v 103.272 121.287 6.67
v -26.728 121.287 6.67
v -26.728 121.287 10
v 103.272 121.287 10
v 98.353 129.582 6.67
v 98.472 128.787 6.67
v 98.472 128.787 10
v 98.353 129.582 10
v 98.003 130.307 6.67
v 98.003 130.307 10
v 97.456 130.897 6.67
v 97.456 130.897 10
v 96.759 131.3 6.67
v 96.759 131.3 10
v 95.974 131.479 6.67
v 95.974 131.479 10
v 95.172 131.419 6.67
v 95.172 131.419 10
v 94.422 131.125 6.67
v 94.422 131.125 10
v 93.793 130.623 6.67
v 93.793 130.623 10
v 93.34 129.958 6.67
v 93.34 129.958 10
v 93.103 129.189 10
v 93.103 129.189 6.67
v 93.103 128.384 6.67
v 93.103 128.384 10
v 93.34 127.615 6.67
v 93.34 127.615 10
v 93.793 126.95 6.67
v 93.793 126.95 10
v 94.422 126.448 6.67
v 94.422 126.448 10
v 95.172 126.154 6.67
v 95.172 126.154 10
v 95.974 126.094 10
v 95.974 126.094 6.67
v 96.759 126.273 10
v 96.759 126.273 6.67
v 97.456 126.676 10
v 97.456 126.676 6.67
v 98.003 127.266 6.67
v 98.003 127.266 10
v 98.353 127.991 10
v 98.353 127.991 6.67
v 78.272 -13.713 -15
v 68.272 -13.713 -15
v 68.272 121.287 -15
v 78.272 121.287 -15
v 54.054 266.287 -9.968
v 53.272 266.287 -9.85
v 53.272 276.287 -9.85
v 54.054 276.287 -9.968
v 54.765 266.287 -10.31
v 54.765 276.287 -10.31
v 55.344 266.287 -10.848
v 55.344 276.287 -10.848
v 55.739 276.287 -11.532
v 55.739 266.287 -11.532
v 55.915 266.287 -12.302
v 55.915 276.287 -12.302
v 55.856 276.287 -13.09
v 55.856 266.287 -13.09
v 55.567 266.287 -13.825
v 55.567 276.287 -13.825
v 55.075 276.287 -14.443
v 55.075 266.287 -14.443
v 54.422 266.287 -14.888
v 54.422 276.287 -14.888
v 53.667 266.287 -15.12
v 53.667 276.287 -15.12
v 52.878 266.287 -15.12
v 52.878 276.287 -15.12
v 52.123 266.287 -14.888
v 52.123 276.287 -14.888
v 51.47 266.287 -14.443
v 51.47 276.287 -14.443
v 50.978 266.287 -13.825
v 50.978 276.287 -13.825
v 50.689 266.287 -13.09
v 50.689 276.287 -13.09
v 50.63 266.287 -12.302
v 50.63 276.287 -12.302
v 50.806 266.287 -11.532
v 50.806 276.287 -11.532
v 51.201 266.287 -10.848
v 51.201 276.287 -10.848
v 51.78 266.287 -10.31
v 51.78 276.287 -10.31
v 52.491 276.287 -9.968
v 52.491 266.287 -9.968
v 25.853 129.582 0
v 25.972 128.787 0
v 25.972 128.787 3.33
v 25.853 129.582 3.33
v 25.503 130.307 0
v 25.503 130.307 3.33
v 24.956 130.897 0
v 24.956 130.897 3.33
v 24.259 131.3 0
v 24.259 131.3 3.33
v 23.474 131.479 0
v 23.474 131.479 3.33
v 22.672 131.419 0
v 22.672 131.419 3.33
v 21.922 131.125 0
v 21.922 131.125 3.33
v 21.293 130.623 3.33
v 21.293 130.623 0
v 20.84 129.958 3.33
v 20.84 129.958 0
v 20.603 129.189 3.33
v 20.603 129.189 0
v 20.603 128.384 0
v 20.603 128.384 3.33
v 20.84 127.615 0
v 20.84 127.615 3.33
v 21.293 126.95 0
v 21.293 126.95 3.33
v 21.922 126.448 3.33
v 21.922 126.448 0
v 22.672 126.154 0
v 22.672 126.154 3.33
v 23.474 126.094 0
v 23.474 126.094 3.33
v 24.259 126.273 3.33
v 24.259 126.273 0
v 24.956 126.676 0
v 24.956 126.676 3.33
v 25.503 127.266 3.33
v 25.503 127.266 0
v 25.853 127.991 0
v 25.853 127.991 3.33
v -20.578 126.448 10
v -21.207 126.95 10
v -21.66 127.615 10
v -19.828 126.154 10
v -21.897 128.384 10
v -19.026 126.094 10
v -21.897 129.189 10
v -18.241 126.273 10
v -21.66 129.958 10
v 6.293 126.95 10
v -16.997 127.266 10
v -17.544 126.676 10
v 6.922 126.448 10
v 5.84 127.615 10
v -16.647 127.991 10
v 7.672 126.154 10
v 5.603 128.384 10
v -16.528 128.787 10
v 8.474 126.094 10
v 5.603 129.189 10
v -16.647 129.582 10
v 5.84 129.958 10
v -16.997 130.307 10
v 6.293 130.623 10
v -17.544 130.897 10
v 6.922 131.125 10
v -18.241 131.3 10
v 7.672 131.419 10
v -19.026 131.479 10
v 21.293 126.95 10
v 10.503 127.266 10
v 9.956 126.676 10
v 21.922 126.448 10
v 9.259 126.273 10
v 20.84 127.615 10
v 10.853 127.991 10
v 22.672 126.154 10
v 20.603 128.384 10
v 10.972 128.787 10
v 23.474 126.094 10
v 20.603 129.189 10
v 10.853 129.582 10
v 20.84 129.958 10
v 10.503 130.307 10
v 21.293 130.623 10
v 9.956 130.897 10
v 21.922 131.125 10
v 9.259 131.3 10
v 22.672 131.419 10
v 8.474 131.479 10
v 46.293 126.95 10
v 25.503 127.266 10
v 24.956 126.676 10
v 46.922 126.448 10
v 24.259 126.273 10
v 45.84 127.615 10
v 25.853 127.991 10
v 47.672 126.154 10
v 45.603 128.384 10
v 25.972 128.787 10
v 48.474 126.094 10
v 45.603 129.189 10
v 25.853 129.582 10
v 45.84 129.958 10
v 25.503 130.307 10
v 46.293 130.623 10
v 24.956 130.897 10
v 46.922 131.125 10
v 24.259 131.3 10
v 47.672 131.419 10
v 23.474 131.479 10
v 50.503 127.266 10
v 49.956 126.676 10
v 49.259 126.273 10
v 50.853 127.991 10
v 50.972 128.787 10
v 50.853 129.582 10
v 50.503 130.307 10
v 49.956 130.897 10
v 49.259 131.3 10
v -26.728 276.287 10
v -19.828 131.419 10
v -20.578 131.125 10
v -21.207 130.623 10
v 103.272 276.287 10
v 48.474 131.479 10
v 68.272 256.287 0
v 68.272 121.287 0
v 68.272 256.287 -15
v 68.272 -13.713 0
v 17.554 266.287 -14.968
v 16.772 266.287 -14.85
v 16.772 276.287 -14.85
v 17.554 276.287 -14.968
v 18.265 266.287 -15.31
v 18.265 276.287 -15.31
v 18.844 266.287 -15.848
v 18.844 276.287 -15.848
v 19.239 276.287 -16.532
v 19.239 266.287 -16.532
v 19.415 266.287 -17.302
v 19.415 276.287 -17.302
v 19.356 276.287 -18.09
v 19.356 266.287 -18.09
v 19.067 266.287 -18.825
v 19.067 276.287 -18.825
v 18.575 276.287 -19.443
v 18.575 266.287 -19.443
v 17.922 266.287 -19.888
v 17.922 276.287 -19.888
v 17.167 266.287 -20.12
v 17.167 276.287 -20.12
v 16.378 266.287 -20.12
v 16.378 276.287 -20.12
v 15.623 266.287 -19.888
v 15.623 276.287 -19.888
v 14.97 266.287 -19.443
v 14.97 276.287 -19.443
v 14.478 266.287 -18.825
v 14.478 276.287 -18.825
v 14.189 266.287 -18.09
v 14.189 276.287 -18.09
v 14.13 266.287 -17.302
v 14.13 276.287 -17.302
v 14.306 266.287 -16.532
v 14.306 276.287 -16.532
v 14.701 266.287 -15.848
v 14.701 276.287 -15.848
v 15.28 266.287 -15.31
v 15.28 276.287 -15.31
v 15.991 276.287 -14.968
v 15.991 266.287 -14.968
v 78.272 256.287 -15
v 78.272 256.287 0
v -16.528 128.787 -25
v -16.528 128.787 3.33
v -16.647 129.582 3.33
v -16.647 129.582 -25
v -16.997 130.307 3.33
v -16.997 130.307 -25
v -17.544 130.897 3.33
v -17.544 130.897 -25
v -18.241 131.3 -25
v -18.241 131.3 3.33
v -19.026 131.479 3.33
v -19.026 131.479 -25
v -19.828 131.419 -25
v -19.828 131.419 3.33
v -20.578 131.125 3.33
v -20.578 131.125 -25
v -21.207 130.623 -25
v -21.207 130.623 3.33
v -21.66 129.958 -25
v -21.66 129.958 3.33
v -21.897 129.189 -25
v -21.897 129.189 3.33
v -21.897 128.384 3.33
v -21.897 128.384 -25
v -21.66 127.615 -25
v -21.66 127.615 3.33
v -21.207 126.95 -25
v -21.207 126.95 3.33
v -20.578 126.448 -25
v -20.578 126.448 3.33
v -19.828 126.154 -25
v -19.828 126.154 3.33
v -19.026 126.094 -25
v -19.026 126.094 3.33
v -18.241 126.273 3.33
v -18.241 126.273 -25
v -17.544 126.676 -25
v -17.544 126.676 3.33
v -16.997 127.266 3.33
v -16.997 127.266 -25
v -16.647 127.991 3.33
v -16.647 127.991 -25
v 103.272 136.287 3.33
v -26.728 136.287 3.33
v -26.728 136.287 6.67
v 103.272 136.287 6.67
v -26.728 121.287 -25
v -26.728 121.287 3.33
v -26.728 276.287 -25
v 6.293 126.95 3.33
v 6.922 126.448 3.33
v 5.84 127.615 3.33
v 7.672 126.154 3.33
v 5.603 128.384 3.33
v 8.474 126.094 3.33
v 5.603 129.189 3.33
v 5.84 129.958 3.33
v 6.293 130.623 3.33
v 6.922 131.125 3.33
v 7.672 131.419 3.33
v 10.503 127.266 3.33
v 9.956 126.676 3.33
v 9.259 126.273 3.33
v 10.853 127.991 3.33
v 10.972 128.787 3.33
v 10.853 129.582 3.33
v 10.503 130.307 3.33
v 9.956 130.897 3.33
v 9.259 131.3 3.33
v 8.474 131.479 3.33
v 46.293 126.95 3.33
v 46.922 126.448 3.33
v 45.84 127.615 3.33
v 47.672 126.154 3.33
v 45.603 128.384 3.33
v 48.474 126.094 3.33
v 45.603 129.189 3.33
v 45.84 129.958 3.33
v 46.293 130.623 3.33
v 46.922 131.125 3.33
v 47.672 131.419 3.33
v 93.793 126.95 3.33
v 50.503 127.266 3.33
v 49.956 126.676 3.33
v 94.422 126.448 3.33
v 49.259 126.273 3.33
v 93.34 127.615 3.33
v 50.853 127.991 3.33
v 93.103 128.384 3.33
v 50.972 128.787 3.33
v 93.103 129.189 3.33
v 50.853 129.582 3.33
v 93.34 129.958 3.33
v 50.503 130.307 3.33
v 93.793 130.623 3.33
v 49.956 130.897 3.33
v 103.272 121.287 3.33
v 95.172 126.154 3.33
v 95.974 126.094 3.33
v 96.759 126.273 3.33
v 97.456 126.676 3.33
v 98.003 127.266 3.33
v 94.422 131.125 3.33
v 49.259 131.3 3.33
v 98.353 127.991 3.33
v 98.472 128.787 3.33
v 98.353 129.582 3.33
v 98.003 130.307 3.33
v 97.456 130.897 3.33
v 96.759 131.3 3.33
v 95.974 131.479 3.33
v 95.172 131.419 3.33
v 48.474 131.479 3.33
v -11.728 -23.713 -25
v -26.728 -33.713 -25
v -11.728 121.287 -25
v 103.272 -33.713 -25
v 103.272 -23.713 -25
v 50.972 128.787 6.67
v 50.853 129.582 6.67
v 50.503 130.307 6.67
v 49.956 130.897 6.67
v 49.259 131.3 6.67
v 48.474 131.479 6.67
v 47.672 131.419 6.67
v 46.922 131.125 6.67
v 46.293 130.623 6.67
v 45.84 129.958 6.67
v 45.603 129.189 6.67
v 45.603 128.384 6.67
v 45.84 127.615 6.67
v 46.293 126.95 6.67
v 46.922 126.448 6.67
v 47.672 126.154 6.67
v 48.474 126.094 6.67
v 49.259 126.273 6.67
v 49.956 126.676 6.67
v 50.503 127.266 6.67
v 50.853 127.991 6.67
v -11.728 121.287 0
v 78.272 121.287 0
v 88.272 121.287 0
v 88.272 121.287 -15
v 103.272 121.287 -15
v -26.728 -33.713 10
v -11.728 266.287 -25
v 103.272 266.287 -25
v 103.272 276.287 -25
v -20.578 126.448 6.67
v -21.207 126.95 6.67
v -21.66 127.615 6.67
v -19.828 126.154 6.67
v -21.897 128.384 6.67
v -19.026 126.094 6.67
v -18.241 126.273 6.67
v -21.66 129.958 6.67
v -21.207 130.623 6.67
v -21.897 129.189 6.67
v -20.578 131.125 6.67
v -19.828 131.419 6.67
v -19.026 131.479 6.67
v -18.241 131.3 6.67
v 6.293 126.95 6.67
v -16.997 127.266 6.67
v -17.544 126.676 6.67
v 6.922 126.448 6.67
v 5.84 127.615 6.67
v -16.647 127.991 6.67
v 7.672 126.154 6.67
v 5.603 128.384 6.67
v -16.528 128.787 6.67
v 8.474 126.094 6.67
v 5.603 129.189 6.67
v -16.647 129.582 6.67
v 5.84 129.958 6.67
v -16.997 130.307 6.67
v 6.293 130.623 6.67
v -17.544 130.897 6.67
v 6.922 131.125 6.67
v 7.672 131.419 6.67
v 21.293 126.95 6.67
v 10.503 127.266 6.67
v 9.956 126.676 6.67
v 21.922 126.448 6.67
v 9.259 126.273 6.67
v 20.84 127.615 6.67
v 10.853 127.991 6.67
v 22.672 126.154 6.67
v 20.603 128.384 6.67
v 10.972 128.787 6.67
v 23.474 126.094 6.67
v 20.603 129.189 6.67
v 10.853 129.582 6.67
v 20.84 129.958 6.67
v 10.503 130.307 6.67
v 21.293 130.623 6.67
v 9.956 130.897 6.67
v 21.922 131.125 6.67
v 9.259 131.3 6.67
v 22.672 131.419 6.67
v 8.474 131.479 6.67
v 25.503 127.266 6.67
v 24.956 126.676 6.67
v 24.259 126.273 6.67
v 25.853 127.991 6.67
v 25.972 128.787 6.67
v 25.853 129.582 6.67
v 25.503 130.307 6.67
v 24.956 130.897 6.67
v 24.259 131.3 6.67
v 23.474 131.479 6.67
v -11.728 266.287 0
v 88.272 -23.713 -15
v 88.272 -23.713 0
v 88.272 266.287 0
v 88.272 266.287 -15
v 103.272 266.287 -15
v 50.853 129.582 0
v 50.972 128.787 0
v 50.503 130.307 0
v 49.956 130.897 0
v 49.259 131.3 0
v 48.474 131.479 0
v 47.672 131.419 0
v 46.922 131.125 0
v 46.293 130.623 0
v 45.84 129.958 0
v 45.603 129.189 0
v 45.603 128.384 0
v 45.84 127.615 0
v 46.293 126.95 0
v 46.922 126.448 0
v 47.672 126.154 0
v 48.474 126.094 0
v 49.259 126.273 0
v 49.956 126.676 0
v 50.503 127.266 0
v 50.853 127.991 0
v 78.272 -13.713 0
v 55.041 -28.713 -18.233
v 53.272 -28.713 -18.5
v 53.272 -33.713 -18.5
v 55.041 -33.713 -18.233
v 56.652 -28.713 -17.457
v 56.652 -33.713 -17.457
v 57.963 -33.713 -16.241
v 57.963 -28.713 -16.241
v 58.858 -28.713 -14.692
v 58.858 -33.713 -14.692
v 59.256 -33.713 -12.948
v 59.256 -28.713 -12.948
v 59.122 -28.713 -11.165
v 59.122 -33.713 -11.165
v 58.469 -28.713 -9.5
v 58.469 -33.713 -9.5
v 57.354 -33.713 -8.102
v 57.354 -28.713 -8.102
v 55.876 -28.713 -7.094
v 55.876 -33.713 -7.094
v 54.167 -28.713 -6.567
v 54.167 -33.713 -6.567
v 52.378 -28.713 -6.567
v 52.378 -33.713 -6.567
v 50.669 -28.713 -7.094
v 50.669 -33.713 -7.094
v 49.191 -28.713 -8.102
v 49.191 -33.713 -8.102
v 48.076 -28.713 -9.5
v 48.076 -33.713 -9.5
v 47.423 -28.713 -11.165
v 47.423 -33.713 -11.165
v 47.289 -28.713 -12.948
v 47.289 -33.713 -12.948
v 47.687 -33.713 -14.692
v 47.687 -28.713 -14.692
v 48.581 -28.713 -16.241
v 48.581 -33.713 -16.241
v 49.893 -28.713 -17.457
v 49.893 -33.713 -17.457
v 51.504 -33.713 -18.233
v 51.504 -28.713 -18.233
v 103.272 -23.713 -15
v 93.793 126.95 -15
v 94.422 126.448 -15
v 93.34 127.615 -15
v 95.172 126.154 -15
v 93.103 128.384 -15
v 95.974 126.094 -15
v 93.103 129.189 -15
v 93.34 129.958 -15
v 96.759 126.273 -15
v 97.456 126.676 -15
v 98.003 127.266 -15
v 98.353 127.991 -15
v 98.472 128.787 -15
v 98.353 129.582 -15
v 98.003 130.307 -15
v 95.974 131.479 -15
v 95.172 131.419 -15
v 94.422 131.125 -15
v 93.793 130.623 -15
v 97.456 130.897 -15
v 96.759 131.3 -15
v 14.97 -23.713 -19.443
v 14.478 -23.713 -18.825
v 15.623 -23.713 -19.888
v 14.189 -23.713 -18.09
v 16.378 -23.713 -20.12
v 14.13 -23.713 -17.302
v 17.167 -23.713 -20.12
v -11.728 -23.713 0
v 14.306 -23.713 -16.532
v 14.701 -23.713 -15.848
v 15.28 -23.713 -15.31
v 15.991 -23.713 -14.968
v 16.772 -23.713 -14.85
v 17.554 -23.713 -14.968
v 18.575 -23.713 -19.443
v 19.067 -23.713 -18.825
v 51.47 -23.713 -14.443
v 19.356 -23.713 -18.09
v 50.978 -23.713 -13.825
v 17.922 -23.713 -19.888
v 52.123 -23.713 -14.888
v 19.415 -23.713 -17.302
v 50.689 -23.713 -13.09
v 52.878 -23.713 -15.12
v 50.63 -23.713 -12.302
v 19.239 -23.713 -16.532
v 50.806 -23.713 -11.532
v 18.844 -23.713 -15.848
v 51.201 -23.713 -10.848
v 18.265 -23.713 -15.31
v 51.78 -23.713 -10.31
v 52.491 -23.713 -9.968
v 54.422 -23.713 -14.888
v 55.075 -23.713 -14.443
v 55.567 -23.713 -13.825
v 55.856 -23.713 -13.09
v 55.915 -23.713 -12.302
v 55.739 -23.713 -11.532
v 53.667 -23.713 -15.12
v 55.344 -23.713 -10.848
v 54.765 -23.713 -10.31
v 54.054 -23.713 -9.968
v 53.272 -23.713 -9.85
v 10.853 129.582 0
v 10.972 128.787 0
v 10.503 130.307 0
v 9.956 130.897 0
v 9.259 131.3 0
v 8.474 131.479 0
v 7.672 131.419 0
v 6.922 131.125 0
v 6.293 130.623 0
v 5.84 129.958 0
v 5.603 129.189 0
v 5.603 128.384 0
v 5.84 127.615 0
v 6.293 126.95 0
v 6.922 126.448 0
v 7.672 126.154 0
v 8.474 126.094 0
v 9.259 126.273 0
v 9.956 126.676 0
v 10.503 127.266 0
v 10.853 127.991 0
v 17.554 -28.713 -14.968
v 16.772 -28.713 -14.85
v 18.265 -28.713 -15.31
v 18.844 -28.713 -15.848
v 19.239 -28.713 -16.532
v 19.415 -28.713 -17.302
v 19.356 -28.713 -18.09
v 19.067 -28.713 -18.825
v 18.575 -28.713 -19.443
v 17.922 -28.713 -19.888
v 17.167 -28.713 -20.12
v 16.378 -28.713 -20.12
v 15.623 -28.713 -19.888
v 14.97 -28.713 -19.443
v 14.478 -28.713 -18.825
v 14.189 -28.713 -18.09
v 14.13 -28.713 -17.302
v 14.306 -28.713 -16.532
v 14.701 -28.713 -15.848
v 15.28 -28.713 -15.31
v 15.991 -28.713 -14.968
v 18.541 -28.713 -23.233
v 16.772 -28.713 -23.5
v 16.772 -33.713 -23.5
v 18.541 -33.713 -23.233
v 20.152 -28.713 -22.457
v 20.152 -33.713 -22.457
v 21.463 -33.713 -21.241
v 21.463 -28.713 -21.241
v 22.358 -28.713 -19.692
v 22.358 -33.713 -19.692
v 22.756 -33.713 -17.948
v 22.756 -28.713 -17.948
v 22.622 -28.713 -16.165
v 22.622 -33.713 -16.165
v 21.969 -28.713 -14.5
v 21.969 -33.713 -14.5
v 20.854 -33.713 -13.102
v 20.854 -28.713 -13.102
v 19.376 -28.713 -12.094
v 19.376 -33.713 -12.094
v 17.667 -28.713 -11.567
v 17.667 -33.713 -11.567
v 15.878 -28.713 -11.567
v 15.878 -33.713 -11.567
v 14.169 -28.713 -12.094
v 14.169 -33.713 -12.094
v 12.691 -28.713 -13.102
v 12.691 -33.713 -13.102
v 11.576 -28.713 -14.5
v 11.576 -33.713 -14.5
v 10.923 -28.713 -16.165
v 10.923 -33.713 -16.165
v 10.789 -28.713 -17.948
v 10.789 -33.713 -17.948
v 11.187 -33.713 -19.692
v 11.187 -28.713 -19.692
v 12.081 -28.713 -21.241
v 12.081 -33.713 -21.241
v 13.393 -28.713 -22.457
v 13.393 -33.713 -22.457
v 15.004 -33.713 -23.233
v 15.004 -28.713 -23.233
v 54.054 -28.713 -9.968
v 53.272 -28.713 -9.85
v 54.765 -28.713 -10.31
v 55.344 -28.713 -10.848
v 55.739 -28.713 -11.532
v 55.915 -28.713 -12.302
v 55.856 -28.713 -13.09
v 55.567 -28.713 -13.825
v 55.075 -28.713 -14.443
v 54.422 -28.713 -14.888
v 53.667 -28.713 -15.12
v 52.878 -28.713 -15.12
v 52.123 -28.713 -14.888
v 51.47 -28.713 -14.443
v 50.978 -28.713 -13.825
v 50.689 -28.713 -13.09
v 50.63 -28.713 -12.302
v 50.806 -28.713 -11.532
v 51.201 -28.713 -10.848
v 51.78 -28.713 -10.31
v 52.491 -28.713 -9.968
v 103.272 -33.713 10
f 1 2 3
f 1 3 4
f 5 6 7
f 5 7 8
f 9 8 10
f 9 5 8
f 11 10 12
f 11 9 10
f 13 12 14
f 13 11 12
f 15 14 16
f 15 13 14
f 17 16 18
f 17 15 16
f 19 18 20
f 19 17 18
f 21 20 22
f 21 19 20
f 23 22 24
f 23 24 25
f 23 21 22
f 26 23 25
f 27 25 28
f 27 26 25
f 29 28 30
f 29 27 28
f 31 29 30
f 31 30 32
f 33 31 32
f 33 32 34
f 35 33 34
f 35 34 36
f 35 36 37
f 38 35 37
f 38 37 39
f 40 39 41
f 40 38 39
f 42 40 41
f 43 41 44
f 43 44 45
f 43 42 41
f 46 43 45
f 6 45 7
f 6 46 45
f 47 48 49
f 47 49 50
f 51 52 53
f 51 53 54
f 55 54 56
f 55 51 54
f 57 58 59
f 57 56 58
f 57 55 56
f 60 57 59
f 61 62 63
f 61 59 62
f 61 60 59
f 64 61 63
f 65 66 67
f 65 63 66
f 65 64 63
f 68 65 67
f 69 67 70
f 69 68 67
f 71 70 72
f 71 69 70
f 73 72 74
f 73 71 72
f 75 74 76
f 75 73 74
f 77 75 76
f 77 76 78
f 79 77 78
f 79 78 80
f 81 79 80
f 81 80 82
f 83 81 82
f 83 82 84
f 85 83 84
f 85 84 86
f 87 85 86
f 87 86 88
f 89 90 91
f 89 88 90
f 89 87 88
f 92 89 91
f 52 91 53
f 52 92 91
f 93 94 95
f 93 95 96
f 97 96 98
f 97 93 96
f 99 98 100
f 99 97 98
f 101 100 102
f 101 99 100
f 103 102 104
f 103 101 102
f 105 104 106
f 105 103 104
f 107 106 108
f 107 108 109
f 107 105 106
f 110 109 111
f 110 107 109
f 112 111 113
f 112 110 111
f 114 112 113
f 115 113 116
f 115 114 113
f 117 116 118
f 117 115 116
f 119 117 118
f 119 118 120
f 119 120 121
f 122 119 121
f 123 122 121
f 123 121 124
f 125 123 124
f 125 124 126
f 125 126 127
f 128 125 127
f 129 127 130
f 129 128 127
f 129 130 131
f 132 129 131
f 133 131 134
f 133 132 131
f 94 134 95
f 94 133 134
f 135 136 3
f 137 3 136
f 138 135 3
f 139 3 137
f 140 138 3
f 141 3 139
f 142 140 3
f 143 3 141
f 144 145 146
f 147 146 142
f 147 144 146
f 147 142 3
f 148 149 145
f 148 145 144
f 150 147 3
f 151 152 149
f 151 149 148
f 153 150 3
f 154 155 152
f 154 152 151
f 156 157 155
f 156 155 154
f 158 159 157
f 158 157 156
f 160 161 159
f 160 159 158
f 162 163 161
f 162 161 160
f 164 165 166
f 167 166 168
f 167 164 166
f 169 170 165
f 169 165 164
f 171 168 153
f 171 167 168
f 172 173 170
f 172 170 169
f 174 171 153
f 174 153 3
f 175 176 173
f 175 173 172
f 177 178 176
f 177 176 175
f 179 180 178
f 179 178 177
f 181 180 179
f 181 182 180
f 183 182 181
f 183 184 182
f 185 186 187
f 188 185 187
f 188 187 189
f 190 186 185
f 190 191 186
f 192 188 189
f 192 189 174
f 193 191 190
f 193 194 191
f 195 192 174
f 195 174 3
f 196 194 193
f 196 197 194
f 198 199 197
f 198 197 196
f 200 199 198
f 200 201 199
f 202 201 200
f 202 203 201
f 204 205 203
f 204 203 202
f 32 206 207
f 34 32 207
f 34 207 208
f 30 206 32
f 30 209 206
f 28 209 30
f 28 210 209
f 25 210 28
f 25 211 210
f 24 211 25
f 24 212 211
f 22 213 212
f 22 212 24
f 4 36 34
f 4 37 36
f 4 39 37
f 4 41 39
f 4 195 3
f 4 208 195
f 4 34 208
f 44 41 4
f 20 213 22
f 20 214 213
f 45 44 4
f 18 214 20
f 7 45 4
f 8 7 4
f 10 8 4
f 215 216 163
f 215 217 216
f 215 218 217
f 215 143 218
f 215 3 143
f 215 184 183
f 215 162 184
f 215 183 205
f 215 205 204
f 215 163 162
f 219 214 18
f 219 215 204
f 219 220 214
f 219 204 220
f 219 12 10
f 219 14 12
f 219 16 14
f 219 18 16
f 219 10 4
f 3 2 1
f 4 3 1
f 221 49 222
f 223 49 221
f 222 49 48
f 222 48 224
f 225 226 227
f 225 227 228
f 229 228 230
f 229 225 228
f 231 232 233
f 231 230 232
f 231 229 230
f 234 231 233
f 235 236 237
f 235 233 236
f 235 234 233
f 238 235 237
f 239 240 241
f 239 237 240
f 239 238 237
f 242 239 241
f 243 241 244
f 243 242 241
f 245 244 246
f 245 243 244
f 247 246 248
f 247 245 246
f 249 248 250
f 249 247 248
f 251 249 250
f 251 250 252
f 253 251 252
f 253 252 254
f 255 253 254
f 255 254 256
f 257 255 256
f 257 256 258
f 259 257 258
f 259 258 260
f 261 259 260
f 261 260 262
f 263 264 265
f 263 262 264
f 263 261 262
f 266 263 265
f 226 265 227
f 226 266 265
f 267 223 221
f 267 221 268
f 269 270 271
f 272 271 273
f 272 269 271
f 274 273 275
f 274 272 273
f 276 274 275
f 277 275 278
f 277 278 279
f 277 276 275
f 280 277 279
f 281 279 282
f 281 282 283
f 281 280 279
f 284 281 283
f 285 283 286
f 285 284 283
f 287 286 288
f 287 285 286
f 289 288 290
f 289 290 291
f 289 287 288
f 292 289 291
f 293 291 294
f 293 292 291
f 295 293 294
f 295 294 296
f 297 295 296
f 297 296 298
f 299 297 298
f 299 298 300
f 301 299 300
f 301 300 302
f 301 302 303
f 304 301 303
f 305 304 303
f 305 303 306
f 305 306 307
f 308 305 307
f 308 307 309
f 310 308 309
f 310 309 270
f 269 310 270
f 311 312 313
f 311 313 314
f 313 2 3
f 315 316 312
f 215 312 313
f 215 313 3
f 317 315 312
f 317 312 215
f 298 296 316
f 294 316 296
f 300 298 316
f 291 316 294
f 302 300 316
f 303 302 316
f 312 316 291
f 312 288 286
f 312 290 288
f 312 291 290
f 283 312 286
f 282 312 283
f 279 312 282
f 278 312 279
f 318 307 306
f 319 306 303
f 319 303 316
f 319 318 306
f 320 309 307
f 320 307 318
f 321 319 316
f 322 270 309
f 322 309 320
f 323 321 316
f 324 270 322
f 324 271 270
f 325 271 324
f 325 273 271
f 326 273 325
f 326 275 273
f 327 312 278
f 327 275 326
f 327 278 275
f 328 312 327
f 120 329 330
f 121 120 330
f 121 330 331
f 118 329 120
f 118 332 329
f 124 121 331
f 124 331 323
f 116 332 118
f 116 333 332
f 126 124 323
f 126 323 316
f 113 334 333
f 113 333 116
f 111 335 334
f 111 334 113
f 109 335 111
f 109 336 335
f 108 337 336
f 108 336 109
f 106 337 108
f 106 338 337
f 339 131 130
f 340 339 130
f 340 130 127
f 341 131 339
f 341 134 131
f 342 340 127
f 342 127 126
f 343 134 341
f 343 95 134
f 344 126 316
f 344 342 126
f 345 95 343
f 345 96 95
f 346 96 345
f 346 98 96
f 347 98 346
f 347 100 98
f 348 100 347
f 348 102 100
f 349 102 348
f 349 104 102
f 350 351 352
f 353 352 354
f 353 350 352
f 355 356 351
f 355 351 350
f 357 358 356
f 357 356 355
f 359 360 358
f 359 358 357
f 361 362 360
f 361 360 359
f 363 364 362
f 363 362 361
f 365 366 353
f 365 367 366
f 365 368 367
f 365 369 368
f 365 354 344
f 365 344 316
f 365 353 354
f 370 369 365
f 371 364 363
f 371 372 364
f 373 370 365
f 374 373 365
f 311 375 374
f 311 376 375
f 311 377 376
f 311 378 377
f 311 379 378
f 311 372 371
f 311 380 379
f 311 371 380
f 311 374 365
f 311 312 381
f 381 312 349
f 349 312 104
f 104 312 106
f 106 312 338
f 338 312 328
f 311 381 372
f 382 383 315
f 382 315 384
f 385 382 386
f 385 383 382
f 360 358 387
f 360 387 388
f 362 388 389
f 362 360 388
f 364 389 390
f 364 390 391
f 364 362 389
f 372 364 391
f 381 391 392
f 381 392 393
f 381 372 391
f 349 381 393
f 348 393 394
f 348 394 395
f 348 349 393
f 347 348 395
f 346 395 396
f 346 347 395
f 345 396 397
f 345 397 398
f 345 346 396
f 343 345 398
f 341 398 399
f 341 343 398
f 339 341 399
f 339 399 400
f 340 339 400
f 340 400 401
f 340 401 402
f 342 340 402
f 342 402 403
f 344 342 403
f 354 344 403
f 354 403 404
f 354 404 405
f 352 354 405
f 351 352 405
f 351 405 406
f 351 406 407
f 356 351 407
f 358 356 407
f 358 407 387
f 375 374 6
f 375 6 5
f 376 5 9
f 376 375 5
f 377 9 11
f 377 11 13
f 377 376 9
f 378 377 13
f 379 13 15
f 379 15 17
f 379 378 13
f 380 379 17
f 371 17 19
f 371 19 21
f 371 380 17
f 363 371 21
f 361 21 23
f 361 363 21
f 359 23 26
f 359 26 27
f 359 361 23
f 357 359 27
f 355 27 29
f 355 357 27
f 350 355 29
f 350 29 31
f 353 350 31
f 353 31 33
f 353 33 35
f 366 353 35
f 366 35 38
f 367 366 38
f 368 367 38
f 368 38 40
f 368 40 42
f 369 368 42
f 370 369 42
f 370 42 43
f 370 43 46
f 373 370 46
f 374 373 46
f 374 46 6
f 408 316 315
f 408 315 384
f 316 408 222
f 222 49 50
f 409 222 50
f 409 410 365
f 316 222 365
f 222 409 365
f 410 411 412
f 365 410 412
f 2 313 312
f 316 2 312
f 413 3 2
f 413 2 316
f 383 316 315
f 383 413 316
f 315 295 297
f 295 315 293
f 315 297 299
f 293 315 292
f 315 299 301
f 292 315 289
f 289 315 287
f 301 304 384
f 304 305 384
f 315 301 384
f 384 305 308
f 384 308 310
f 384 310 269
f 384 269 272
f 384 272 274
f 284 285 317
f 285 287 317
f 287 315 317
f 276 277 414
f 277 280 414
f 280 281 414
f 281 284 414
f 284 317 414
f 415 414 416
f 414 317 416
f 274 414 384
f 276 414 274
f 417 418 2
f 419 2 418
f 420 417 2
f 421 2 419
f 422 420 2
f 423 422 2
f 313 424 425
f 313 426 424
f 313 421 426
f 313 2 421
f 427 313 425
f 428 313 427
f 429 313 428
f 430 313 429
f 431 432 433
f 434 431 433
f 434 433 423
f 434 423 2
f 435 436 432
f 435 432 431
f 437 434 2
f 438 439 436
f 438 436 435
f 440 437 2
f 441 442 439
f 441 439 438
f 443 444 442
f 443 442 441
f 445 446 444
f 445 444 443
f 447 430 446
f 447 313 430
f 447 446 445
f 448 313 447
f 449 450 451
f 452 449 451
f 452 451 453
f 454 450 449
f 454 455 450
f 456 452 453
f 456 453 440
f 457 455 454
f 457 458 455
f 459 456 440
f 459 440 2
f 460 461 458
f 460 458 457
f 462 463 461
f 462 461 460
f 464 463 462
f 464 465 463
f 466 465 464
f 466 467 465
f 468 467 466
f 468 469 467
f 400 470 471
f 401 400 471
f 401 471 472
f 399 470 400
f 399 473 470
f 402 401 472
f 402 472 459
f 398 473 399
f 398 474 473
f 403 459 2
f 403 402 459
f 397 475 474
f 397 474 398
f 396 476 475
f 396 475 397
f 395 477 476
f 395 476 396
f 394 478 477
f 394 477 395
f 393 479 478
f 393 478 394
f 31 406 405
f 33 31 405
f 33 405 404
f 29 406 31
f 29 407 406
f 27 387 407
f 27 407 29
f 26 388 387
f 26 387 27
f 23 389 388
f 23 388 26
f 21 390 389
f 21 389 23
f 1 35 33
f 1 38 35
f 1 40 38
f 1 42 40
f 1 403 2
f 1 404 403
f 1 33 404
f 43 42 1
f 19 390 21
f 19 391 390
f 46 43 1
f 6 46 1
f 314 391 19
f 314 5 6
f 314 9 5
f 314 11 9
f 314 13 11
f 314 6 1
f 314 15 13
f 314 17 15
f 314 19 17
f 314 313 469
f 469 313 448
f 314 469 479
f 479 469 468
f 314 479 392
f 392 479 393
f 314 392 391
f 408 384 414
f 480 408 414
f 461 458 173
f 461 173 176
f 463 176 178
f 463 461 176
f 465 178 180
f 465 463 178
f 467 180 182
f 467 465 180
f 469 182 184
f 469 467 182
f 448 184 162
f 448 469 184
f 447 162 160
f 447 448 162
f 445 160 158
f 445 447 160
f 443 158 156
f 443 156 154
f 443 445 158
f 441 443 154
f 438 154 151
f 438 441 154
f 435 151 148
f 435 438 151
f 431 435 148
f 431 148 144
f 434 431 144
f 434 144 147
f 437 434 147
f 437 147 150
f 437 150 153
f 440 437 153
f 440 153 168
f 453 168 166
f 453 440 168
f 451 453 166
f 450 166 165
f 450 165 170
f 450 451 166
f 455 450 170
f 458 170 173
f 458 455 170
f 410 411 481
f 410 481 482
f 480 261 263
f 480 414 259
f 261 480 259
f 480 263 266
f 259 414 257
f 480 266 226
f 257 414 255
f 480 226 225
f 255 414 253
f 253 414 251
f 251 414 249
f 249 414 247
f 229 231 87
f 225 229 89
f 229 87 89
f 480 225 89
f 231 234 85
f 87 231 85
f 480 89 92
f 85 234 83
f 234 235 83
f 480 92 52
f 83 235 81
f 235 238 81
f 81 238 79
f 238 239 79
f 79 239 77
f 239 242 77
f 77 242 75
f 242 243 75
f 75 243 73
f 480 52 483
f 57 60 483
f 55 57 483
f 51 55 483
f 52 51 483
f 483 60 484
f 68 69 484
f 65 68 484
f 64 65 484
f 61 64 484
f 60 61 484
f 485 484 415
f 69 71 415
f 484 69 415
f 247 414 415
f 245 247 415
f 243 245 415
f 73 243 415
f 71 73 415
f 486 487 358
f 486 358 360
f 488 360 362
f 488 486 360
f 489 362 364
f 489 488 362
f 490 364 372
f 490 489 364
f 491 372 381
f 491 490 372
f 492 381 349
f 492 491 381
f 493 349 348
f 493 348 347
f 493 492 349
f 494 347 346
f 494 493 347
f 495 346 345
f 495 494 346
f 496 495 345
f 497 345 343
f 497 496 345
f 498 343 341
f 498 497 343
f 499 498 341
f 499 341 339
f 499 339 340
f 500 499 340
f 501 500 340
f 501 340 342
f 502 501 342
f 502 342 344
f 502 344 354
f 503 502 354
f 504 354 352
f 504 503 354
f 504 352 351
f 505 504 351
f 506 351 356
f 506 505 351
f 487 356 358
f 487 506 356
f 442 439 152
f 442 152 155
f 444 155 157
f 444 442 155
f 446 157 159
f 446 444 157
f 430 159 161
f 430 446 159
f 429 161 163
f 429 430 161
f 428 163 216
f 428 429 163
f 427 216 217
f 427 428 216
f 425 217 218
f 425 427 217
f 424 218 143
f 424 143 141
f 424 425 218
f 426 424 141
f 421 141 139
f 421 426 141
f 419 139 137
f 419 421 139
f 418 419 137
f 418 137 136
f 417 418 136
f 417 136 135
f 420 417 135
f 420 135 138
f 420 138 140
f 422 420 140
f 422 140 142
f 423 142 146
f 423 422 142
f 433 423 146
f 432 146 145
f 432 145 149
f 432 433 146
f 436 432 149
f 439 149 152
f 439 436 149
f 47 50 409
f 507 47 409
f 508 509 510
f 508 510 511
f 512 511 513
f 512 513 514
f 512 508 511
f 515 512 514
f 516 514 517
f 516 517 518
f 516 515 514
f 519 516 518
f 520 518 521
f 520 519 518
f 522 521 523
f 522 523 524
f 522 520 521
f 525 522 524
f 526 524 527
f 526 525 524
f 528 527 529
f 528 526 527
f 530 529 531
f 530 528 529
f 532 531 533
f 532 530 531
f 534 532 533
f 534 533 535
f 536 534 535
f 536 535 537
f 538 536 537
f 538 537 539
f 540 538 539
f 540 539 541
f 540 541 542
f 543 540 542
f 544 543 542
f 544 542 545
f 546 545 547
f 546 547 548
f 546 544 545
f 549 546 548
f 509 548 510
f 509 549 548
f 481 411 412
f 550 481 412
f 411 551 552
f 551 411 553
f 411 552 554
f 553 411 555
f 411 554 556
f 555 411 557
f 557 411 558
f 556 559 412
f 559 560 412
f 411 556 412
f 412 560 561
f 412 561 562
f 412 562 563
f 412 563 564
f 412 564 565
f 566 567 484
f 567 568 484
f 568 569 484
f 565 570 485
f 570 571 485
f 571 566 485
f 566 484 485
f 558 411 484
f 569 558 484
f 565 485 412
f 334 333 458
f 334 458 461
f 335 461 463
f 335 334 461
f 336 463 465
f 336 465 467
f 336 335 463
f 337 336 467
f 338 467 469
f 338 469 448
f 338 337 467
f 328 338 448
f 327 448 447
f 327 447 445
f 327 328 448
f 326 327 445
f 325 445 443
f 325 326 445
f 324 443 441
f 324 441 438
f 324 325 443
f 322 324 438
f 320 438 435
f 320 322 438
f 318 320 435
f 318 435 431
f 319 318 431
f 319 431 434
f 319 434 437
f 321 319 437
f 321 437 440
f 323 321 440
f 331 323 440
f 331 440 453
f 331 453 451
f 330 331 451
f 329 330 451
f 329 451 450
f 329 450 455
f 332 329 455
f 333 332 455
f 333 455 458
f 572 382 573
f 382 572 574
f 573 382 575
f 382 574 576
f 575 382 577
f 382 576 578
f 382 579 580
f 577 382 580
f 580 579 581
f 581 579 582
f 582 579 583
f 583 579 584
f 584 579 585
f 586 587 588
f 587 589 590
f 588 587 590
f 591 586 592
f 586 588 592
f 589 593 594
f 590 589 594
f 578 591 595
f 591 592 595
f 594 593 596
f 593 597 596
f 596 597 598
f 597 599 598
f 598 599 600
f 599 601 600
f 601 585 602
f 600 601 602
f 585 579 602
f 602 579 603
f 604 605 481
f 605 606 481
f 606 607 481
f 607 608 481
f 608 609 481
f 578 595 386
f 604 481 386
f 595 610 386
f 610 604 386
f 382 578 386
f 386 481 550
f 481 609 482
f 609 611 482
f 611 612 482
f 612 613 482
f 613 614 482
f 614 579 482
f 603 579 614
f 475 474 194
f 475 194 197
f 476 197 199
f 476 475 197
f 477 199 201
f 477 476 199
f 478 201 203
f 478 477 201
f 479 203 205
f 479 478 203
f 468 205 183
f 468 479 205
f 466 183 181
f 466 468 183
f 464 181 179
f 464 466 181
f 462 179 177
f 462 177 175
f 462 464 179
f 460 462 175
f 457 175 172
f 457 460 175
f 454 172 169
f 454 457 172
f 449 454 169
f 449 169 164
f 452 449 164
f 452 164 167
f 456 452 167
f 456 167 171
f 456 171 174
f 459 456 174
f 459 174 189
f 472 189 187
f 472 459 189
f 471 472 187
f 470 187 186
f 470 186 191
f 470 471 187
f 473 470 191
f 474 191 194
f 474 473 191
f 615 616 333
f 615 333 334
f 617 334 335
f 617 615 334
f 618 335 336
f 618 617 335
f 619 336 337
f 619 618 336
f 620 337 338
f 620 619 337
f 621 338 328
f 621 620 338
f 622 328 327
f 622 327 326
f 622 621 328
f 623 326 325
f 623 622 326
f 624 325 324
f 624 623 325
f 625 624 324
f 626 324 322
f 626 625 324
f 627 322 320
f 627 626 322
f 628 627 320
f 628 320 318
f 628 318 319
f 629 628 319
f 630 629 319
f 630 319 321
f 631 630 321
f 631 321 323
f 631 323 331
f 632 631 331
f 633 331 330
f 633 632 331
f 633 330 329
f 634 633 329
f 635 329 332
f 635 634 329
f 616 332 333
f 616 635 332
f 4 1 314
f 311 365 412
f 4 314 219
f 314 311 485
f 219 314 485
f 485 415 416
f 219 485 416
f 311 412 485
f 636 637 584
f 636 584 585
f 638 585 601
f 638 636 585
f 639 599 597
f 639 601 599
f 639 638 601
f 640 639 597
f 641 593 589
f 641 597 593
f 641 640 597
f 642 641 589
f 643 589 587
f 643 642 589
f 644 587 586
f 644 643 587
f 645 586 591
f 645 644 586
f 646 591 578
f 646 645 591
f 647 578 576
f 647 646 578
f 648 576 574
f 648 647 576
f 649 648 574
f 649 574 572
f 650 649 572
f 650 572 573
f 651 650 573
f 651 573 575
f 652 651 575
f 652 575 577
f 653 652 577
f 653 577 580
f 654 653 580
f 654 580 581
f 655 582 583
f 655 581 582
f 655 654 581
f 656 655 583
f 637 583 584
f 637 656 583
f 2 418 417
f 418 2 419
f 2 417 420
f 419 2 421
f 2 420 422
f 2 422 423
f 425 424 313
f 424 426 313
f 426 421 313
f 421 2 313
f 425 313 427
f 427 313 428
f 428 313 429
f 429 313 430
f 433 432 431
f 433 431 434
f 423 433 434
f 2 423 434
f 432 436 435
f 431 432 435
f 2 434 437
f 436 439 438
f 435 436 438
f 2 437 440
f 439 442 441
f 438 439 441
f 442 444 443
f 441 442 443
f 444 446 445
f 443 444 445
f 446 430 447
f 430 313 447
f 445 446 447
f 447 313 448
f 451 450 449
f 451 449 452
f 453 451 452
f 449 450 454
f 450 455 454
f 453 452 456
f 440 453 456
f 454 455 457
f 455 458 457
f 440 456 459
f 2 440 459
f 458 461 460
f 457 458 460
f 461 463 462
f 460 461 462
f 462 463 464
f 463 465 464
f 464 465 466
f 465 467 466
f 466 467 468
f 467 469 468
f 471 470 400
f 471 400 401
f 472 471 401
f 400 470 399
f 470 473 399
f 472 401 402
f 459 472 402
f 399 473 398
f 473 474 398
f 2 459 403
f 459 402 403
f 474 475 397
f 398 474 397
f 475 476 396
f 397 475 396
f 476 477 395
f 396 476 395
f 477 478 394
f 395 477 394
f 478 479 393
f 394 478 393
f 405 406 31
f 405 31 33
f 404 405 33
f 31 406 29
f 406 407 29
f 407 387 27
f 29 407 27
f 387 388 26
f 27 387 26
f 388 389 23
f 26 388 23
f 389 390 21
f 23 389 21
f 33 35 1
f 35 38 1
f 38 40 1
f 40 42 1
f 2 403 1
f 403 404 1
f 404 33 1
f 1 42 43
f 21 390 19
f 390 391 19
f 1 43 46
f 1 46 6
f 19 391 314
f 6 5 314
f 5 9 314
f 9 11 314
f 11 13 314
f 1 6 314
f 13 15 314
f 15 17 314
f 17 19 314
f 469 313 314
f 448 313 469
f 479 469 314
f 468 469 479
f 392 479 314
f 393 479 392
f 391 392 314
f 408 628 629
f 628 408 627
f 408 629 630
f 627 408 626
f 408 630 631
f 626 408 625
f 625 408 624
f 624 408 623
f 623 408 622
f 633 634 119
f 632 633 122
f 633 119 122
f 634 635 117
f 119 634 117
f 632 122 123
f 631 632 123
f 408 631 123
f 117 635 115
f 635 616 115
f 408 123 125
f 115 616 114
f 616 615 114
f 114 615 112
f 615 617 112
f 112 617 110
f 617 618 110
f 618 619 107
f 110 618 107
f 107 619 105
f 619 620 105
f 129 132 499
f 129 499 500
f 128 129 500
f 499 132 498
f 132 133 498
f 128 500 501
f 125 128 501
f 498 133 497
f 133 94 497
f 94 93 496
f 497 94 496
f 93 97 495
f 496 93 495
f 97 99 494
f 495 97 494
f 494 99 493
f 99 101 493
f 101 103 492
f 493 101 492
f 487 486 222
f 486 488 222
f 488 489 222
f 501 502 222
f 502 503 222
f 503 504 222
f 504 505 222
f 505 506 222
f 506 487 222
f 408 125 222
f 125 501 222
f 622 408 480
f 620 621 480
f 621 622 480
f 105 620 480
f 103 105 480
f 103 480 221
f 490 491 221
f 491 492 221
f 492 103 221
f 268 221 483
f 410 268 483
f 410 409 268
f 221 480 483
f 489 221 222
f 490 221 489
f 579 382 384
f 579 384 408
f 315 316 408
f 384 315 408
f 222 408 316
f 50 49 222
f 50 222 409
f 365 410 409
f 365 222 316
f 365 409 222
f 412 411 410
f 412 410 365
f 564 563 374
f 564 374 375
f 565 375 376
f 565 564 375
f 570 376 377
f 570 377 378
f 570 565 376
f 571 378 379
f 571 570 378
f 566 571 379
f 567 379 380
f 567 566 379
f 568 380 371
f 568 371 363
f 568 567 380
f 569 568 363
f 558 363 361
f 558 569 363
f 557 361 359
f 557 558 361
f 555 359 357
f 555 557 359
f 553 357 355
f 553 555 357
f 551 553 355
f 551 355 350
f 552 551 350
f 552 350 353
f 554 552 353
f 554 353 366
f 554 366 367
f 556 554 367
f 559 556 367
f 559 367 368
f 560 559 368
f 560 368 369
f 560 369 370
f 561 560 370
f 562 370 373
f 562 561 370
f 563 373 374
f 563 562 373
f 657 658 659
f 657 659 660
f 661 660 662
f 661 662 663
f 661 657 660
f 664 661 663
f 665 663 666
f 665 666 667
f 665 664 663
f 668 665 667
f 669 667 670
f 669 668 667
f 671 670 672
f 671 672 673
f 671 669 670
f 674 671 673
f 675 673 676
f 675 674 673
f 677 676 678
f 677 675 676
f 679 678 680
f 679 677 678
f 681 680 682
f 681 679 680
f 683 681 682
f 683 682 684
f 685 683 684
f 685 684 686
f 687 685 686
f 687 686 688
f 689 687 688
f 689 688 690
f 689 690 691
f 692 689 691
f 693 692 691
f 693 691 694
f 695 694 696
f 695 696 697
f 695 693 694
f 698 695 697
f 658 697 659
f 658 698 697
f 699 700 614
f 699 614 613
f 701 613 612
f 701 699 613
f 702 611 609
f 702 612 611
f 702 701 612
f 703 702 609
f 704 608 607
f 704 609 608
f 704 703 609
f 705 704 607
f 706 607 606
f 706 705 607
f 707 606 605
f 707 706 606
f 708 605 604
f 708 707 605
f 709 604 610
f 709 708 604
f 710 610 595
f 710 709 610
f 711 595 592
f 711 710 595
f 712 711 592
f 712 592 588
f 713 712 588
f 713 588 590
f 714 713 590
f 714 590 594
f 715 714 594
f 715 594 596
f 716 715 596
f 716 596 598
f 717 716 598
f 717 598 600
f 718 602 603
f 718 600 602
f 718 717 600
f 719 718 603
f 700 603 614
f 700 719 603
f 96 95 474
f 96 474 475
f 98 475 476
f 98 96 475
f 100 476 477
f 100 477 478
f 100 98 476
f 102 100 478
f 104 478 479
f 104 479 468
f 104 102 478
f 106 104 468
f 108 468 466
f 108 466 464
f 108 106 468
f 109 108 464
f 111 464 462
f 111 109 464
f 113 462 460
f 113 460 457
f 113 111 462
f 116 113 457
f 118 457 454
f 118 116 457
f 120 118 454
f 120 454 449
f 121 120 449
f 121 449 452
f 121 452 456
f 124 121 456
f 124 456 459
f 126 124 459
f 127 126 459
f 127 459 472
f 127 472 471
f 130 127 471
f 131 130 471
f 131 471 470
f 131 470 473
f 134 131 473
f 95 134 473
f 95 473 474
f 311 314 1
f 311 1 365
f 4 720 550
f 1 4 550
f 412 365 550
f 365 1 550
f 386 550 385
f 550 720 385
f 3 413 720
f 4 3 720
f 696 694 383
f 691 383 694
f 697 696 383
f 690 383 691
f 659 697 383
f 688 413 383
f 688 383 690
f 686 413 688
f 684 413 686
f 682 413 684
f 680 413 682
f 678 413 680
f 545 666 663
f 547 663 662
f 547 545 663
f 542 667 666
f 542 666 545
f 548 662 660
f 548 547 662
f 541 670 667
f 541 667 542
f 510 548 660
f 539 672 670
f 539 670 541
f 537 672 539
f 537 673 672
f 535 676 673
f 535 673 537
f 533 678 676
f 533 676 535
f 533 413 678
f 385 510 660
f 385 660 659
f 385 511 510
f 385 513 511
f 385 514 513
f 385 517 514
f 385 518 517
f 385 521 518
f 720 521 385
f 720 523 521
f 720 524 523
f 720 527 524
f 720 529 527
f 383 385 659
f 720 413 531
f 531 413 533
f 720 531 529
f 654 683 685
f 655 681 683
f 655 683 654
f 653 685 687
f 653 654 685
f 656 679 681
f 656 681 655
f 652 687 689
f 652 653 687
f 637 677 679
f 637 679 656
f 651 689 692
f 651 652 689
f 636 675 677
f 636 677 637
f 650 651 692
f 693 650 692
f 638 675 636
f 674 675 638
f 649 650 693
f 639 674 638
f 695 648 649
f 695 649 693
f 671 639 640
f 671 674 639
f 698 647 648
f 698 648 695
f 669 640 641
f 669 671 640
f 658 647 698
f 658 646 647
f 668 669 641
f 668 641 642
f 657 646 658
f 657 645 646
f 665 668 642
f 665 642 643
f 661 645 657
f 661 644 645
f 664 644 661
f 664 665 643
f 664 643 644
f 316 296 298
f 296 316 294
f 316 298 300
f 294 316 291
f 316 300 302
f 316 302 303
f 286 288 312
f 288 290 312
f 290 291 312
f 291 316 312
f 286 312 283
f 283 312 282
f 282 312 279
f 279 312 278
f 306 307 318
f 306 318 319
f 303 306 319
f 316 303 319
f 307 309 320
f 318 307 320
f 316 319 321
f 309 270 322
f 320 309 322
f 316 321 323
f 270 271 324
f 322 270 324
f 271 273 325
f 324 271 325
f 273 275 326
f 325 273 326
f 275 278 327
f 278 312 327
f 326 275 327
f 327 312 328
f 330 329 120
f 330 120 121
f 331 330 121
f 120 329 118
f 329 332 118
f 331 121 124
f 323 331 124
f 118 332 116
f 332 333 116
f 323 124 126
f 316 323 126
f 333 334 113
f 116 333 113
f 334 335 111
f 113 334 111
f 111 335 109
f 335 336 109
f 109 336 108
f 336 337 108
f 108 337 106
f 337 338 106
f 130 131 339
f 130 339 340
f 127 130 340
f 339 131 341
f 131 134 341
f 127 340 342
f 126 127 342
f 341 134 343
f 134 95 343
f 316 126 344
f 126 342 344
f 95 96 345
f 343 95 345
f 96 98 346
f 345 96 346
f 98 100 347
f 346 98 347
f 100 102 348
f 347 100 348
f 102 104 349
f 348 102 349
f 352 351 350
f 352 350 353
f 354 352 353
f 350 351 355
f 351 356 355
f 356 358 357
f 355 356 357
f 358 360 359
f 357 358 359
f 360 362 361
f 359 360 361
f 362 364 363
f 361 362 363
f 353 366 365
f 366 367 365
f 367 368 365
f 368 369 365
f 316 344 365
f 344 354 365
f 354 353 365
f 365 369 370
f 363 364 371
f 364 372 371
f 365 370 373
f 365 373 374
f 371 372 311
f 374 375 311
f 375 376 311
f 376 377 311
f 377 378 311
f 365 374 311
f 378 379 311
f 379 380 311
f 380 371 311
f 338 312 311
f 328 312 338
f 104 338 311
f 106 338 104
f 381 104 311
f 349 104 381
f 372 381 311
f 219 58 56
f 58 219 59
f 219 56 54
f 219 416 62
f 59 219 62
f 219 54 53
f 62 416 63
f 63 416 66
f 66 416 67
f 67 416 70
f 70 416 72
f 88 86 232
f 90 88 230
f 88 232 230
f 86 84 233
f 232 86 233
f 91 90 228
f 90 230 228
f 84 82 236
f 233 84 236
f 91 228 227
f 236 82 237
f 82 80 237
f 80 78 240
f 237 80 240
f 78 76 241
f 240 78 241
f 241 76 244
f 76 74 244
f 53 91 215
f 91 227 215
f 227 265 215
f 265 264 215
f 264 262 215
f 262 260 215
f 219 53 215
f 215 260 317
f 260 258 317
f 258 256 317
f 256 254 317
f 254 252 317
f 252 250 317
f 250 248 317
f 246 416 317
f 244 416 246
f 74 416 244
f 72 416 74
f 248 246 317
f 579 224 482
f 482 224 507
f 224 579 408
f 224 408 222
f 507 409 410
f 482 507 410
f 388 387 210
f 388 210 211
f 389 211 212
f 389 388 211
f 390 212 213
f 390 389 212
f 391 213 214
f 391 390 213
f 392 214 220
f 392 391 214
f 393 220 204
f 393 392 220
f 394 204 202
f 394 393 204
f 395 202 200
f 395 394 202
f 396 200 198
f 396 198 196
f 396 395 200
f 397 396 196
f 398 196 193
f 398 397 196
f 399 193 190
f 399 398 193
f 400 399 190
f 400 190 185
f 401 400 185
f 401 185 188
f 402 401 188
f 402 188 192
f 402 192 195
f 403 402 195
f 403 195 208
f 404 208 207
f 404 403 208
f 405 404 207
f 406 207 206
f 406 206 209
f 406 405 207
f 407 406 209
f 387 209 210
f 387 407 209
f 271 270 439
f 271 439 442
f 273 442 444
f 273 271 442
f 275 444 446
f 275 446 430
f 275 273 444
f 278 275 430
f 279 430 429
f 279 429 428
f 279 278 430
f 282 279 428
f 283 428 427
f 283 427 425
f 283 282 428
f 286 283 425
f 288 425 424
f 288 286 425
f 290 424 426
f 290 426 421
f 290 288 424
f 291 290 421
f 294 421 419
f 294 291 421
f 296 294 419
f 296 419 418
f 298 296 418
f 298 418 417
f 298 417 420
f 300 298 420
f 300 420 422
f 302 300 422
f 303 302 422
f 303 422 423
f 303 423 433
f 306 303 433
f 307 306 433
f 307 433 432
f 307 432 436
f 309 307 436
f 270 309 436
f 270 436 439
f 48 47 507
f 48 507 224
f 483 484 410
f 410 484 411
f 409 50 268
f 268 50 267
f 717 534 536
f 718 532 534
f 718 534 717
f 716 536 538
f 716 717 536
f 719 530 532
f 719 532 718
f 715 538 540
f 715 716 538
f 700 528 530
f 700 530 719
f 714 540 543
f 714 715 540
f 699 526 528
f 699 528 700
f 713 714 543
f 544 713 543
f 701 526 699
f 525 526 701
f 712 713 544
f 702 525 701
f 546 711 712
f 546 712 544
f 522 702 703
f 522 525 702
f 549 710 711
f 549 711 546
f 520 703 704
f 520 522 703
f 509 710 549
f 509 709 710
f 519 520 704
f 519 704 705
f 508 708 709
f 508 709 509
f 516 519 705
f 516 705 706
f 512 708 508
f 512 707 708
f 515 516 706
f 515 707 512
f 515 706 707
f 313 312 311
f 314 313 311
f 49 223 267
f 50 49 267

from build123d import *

# Parameters (mm, degrees)
SKETCH1_W               = 100
SKETCH1_H               = 280
BOSS_EXTRUDE1_DEPTH     = 10
SKETCH2_W               = 100
SKETCH2_H               = 10
BOSS_EXTRUDE2_DEPTH     = 10
SKETCH4_W               = 15
SKETCH4_H               = 35
SKETCH4_H_2             = 25
SKETCH4_W_2             = 10
SKETCH4_H_3             = 15
BOSS_EXTRUDE3_DEPTH     = 290
SKETCH5_W               = 10
SKETCH5_H               = 10
CUT_EXTRUDE1_DEPTH      = 15
SKETCH6_W               = 130
SKETCH6_H               = 35
BOSS_EXTRUDE4_DEPTH     = 10
SKETCH7_W               = 130
SKETCH7_H               = 35
BOSS_EXTRUDE5_DEPTH     = 10
CUT_EXTRUDE2_DEPTH      = 298.025990798
CUT_EXTRUDE2_DEPTH_BACK = 298.025990798
SKETCH15_R              = 2.7
SPLIT1_OUTLINE_W        = 130
SPLIT1_OUTLINE_H        = 140
SPLIT1_DEPTH            = 10
SPLIT1_START            = -15
SPLIT1_2_OUTLINE_R      = 2.7
SPLIT1_2_OUTLINE_W      = 10
SPLIT1_2_OUTLINE_H      = 135
SPLIT1_2_DEPTH          = 18.33
SPLIT1_START_2          = -25
SPLIT1_3_OUTLINE_R      = 2.7
SPLIT1_3_DEPTH          = 10
SPLIT1_START_3          = 6.67
SPLIT1_4_OUTLINE_W      = 130
SPLIT1_4_OUTLINE_H      = 15
SPLIT1_4_OUTLINE_R      = 2.7
SPLIT1_4_DEPTH          = 3.33
SPLIT1_5_OUTLINE_W      = 10
SPLIT1_5_OUTLINE_H      = 15
SPLIT1_5_OUTLINE_W_2    = 80
SPLIT1_5_OUTLINE_R      = 2.7
SPLIT1_5_DEPTH          = 3.33
SPLIT1_6_OUTLINE_W      = 130
SPLIT1_6_OUTLINE_H      = 140
SPLIT1_6_DEPTH          = 35
SPLIT1_7_OUTLINE_W      = 130
SPLIT1_7_OUTLINE_H      = 15
SPLIT1_7_OUTLINE_R      = 2.7
SPLIT1_7_DEPTH          = 28.33
SPLIT1_8_OUTLINE_W      = 130
SPLIT1_8_OUTLINE_H      = 15
SPLIT1_8_OUTLINE_R      = 2.7
SPLIT1_8_DEPTH          = 3.33
CUT_EXTRUDE5_DEPTH      = 328.704446471
CUT_EXTRUDE5_DEPTH_BACK = 328.704446471
SKETCH16_R              = 2.65
CUT_EXTRUDE6_START      = -5
SKETCH17_R              = 6
SKETCH17_R_2            = 2.65
CUT_EXTRUDE6_DEPTH      = 5


# Read off the part's stored shape, not the designer's step: Split1
with BuildPart() as part:
    # Sketch1 → Boss-Extrude1 (new body)
    with BuildSketch(Plane.XY):
        with Locations((38.272475697, 126.286508851)):
            Rectangle(SKETCH1_W, SKETCH1_H)
    extrude(amount=BOSS_EXTRUDE1_DEPTH)

    # Sketch2 → Boss-Extrude2 (add)
    with BuildSketch(Plane.XZ.offset(13.713491149)):
        with Locations((38.272475697, 5)):
            Rectangle(SKETCH2_W, SKETCH2_H)
    extrude(amount=BOSS_EXTRUDE2_DEPTH)

    # Sketch4 → Boss-Extrude3 (add)
    with BuildSketch(Plane.XZ.offset(23.713491149)):
        with Locations((-19.227524303, -7.5)):
            Rectangle(SKETCH4_W, SKETCH4_H)
        with Locations((95.772475697, -2.5)):
            Rectangle(SKETCH4_W, SKETCH4_H_2)
        with Locations((73.272475697, -7.5)):
            Rectangle(SKETCH4_W_2, SKETCH4_H_3)
    extrude(amount=-BOSS_EXTRUDE3_DEPTH)

    # Sketch5 → Cut-Extrude1 (cut)
    with BuildSketch(Plane(origin=(0, 0, -15), x_dir=(-1, 0, 0), z_dir=(0, 0, -1))):
        with Locations((-73.272475697, 261.286508851)):
            Rectangle(SKETCH5_W, SKETCH5_H)
        with Locations((-73.272475697, -18.713491149)):
            Rectangle(SKETCH5_W, SKETCH5_H)
    extrude(amount=-CUT_EXTRUDE1_DEPTH, mode=Mode.SUBTRACT)

    # Sketch6 → Boss-Extrude4 (add)
    with BuildSketch(Plane.XZ.offset(23.713491149)):
        with Locations((38.272475697, -7.5)):
            Rectangle(SKETCH6_W, SKETCH6_H)
    extrude(amount=BOSS_EXTRUDE4_DEPTH)

    # Sketch7 → Boss-Extrude5 (add)
    with BuildSketch(Plane(origin=(0, 266.286508851, 0), x_dir=(1, 0, 0), z_dir=(0, 1, 0))):
        with Locations((38.272475697, 7.5)):
            Rectangle(SKETCH7_W, SKETCH7_H)
    extrude(amount=BOSS_EXTRUDE5_DEPTH)

    # Sketch15 → Cut-Extrude2 (cut, two sides: drawn at the far end of the back side and taken through both)
    with BuildSketch(Plane.XY.offset(10).offset(-CUT_EXTRUDE2_DEPTH_BACK)):
        with Locations((8.272475697, 128.786508851)):
            Circle(SKETCH15_R)
        with Locations((23.272475697, 128.786508851)):
            Circle(SKETCH15_R)
        with Locations((48.272475697, 128.786508851)):
            Circle(SKETCH15_R)
        with Locations((-19.227524303, 128.786508851)):
            Circle(SKETCH15_R)
        with Locations((95.772475697, 128.786508851)):
            Circle(SKETCH15_R)
    extrude(amount=CUT_EXTRUDE2_DEPTH + CUT_EXTRUDE2_DEPTH_BACK, mode=Mode.SUBTRACT)

    # Split1 6 outline → Split1 6 (cut)
    with BuildSketch(Plane.XY.offset(SPLIT1_START_2)):
        with Locations((38.272475697, 206.286508851)):
            Rectangle(SPLIT1_6_OUTLINE_W, SPLIT1_6_OUTLINE_H)
    extrude(amount=SPLIT1_6_DEPTH, mode=Mode.SUBTRACT)

    # Split1 7 outline → Split1 7 (cut)
    with BuildSketch(Plane.XY.offset(SPLIT1_START_2)):
        with Locations((38.272475697, 128.786508851)):
            Rectangle(SPLIT1_7_OUTLINE_W, SPLIT1_7_OUTLINE_H)
        with Locations((95.772475697, 128.786508851)):
            Circle(SPLIT1_7_OUTLINE_R, mode=Mode.SUBTRACT)
        with Locations((48.272475697, 128.786508851)):
            Circle(SPLIT1_7_OUTLINE_R, mode=Mode.SUBTRACT)
        with Locations((8.272475697, 128.786508851)):
            Circle(SPLIT1_7_OUTLINE_R, mode=Mode.SUBTRACT)
        with Locations((23.272475697, 128.786508851)):
            Circle(SPLIT1_7_OUTLINE_R, mode=Mode.SUBTRACT)
        with Locations((-19.227524303, 128.786508851)):
            Circle(SPLIT1_7_OUTLINE_R, mode=Mode.SUBTRACT)
    extrude(amount=SPLIT1_7_DEPTH, mode=Mode.SUBTRACT)

    # Split1 8 outline → Split1 8 (cut)
    with BuildSketch(Plane.XY.offset(SPLIT1_START_3)):
        with Locations((38.272475697, 128.786508851)):
            Rectangle(SPLIT1_8_OUTLINE_W, SPLIT1_8_OUTLINE_H)
        with Locations((95.772475697, 128.786508851)):
            Circle(SPLIT1_8_OUTLINE_R, mode=Mode.SUBTRACT)
        with Locations((48.272475697, 128.786508851)):
            Circle(SPLIT1_8_OUTLINE_R, mode=Mode.SUBTRACT)
        with Locations((8.272475697, 128.786508851)):
            Circle(SPLIT1_8_OUTLINE_R, mode=Mode.SUBTRACT)
        with Locations((23.272475697, 128.786508851)):
            Circle(SPLIT1_8_OUTLINE_R, mode=Mode.SUBTRACT)
        with Locations((-19.227524303, 128.786508851)):
            Circle(SPLIT1_8_OUTLINE_R, mode=Mode.SUBTRACT)
    extrude(amount=SPLIT1_8_DEPTH, mode=Mode.SUBTRACT)


with BuildPart() as body_2:
    # Split1 outline → Split1 (new body)
    with BuildSketch(Plane.XY):
        with Locations((38.272475697, 206.286508851)):
            Rectangle(SPLIT1_OUTLINE_W, SPLIT1_OUTLINE_H)
    extrude(amount=SPLIT1_DEPTH)

    # Split1 2 outline → Split1 2 (add)
    # profile 1 of 2: a face of its own
    with BuildSketch(Plane.XY.offset(SPLIT1_START)):
        Polygon((88.272475697, 121.286508851), (103.272475697, 121.286508851), (103.272475697, 276.286508851), (-26.727524303, 276.286508851), (-26.727524303, 121.286508851), (-11.727524303, 121.286508851), (-11.727524303, 266.286508851), (88.272475697, 266.286508851), align=None)
        with Locations((95.772475697, 128.786508851)):
            Circle(SPLIT1_2_OUTLINE_R, mode=Mode.SUBTRACT)
        with Locations((-19.227524303, 128.786508851)):
            Circle(SPLIT1_2_OUTLINE_R, mode=Mode.SUBTRACT)
    # profile 2 of 2: a face of its own
    with BuildSketch(Plane.XY.offset(SPLIT1_START)):
        with Locations((73.272475697, 188.786508851)):
            Rectangle(SPLIT1_2_OUTLINE_W, SPLIT1_2_OUTLINE_H)
    extrude(amount=SPLIT1_2_DEPTH)

    # Split1 3 outline → Split1 3 (add)
    with BuildSketch(Plane.XY.offset(SPLIT1_START_2)):
        Polygon((103.272475697, 266.286508851), (103.272475697, 276.286508851), (-26.727524303, 276.286508851), (-26.727524303, 121.286508851), (-11.727524303, 121.286508851), (-11.727524303, 266.286508851), align=None)
        with Locations((-19.227524303, 128.786508851)):
            Circle(SPLIT1_3_OUTLINE_R, mode=Mode.SUBTRACT)
    extrude(amount=SPLIT1_3_DEPTH)

    # Split1 4 outline → Split1 4 (add)
    with BuildSketch(Plane.XY.offset(SPLIT1_START_3)):
        with Locations((38.272475697, 128.786508851)):
            Rectangle(SPLIT1_4_OUTLINE_W, SPLIT1_4_OUTLINE_H)
        with Locations((95.772475697, 128.786508851)):
            Circle(SPLIT1_4_OUTLINE_R, mode=Mode.SUBTRACT)
        with Locations((48.272475697, 128.786508851)):
            Circle(SPLIT1_4_OUTLINE_R, mode=Mode.SUBTRACT)
        with Locations((8.272475697, 128.786508851)):
            Circle(SPLIT1_4_OUTLINE_R, mode=Mode.SUBTRACT)
        with Locations((23.272475697, 128.786508851)):
            Circle(SPLIT1_4_OUTLINE_R, mode=Mode.SUBTRACT)
        with Locations((-19.227524303, 128.786508851)):
            Circle(SPLIT1_4_OUTLINE_R, mode=Mode.SUBTRACT)
    extrude(amount=SPLIT1_4_DEPTH)

    # Split1 5 outline → Split1 5 (add)
    # profile 1 of 2: a face of its own
    with BuildSketch(Plane.XY):
        with Locations((83.272475697, 128.786508851)):
            Rectangle(SPLIT1_5_OUTLINE_W, SPLIT1_5_OUTLINE_H)
    # profile 2 of 2: a face of its own
    with BuildSketch(Plane.XY):
        with Locations((28.272475697, 128.786508851)):
            Rectangle(SPLIT1_5_OUTLINE_W_2, SPLIT1_5_OUTLINE_H)
        with Locations((8.272475697, 128.786508851)):
            Circle(SPLIT1_5_OUTLINE_R, mode=Mode.SUBTRACT)
        with Locations((23.272475697, 128.786508851)):
            Circle(SPLIT1_5_OUTLINE_R, mode=Mode.SUBTRACT)
        with Locations((48.272475697, 128.786508851)):
            Circle(SPLIT1_5_OUTLINE_R, mode=Mode.SUBTRACT)
    extrude(amount=SPLIT1_5_DEPTH)


with BuildPart() as cut_extrude5_tool:
    # Sketch16 → Cut-Extrude5 (new, two sides: drawn at the far end of the back side and taken through both)
    with BuildSketch(Plane(origin=(0, 276.286508851, 0), x_dir=(1, 0, 0), z_dir=(0, 1, 0)).offset(-CUT_EXTRUDE5_DEPTH_BACK)):
        with Locations(Location((16.772475697, 17.5, 0), (0, 0, 270))):
            Circle(SKETCH16_R)
        with Locations(Location((53.272475697, 12.5, 0), (0, 0, 270))):
            Circle(SKETCH16_R)
    extrude(amount=CUT_EXTRUDE5_DEPTH + CUT_EXTRUDE5_DEPTH_BACK)


with BuildPart() as part_1:
    add(part.part)

    # Cut-Extrude5: cut by cut_extrude5_tool
    add(cut_extrude5_tool.part, mode=Mode.SUBTRACT)

    # Sketch17 → Cut-Extrude6 (cut)
    # profile 1 of 2: a face of its own
    with BuildSketch(Plane.XZ.offset(33.713491149).offset(CUT_EXTRUDE6_START)):
        with Locations(Location((53.272475697, -12.5, 0), (0, 0, 270))):
            Circle(SKETCH17_R)
        with Locations(Location((53.272475697, -12.5, 0), (0, 0, 90))):
            Circle(SKETCH17_R_2, mode=Mode.SUBTRACT)
    # profile 2 of 2: a face of its own
    with BuildSketch(Plane.XZ.offset(33.713491149).offset(CUT_EXTRUDE6_START)):
        with Locations(Location((16.772475697, -17.5, 0), (0, 0, 270))):
            Circle(SKETCH17_R)
    extrude(amount=CUT_EXTRUDE6_DEPTH, mode=Mode.SUBTRACT)


with BuildPart() as body_2_1:
    add(body_2.part)

    # Cut-Extrude5: cut by cut_extrude5_tool
    add(cut_extrude5_tool.part, mode=Mode.SUBTRACT)


solid = Compound([part_1.part, body_2_1.part])
